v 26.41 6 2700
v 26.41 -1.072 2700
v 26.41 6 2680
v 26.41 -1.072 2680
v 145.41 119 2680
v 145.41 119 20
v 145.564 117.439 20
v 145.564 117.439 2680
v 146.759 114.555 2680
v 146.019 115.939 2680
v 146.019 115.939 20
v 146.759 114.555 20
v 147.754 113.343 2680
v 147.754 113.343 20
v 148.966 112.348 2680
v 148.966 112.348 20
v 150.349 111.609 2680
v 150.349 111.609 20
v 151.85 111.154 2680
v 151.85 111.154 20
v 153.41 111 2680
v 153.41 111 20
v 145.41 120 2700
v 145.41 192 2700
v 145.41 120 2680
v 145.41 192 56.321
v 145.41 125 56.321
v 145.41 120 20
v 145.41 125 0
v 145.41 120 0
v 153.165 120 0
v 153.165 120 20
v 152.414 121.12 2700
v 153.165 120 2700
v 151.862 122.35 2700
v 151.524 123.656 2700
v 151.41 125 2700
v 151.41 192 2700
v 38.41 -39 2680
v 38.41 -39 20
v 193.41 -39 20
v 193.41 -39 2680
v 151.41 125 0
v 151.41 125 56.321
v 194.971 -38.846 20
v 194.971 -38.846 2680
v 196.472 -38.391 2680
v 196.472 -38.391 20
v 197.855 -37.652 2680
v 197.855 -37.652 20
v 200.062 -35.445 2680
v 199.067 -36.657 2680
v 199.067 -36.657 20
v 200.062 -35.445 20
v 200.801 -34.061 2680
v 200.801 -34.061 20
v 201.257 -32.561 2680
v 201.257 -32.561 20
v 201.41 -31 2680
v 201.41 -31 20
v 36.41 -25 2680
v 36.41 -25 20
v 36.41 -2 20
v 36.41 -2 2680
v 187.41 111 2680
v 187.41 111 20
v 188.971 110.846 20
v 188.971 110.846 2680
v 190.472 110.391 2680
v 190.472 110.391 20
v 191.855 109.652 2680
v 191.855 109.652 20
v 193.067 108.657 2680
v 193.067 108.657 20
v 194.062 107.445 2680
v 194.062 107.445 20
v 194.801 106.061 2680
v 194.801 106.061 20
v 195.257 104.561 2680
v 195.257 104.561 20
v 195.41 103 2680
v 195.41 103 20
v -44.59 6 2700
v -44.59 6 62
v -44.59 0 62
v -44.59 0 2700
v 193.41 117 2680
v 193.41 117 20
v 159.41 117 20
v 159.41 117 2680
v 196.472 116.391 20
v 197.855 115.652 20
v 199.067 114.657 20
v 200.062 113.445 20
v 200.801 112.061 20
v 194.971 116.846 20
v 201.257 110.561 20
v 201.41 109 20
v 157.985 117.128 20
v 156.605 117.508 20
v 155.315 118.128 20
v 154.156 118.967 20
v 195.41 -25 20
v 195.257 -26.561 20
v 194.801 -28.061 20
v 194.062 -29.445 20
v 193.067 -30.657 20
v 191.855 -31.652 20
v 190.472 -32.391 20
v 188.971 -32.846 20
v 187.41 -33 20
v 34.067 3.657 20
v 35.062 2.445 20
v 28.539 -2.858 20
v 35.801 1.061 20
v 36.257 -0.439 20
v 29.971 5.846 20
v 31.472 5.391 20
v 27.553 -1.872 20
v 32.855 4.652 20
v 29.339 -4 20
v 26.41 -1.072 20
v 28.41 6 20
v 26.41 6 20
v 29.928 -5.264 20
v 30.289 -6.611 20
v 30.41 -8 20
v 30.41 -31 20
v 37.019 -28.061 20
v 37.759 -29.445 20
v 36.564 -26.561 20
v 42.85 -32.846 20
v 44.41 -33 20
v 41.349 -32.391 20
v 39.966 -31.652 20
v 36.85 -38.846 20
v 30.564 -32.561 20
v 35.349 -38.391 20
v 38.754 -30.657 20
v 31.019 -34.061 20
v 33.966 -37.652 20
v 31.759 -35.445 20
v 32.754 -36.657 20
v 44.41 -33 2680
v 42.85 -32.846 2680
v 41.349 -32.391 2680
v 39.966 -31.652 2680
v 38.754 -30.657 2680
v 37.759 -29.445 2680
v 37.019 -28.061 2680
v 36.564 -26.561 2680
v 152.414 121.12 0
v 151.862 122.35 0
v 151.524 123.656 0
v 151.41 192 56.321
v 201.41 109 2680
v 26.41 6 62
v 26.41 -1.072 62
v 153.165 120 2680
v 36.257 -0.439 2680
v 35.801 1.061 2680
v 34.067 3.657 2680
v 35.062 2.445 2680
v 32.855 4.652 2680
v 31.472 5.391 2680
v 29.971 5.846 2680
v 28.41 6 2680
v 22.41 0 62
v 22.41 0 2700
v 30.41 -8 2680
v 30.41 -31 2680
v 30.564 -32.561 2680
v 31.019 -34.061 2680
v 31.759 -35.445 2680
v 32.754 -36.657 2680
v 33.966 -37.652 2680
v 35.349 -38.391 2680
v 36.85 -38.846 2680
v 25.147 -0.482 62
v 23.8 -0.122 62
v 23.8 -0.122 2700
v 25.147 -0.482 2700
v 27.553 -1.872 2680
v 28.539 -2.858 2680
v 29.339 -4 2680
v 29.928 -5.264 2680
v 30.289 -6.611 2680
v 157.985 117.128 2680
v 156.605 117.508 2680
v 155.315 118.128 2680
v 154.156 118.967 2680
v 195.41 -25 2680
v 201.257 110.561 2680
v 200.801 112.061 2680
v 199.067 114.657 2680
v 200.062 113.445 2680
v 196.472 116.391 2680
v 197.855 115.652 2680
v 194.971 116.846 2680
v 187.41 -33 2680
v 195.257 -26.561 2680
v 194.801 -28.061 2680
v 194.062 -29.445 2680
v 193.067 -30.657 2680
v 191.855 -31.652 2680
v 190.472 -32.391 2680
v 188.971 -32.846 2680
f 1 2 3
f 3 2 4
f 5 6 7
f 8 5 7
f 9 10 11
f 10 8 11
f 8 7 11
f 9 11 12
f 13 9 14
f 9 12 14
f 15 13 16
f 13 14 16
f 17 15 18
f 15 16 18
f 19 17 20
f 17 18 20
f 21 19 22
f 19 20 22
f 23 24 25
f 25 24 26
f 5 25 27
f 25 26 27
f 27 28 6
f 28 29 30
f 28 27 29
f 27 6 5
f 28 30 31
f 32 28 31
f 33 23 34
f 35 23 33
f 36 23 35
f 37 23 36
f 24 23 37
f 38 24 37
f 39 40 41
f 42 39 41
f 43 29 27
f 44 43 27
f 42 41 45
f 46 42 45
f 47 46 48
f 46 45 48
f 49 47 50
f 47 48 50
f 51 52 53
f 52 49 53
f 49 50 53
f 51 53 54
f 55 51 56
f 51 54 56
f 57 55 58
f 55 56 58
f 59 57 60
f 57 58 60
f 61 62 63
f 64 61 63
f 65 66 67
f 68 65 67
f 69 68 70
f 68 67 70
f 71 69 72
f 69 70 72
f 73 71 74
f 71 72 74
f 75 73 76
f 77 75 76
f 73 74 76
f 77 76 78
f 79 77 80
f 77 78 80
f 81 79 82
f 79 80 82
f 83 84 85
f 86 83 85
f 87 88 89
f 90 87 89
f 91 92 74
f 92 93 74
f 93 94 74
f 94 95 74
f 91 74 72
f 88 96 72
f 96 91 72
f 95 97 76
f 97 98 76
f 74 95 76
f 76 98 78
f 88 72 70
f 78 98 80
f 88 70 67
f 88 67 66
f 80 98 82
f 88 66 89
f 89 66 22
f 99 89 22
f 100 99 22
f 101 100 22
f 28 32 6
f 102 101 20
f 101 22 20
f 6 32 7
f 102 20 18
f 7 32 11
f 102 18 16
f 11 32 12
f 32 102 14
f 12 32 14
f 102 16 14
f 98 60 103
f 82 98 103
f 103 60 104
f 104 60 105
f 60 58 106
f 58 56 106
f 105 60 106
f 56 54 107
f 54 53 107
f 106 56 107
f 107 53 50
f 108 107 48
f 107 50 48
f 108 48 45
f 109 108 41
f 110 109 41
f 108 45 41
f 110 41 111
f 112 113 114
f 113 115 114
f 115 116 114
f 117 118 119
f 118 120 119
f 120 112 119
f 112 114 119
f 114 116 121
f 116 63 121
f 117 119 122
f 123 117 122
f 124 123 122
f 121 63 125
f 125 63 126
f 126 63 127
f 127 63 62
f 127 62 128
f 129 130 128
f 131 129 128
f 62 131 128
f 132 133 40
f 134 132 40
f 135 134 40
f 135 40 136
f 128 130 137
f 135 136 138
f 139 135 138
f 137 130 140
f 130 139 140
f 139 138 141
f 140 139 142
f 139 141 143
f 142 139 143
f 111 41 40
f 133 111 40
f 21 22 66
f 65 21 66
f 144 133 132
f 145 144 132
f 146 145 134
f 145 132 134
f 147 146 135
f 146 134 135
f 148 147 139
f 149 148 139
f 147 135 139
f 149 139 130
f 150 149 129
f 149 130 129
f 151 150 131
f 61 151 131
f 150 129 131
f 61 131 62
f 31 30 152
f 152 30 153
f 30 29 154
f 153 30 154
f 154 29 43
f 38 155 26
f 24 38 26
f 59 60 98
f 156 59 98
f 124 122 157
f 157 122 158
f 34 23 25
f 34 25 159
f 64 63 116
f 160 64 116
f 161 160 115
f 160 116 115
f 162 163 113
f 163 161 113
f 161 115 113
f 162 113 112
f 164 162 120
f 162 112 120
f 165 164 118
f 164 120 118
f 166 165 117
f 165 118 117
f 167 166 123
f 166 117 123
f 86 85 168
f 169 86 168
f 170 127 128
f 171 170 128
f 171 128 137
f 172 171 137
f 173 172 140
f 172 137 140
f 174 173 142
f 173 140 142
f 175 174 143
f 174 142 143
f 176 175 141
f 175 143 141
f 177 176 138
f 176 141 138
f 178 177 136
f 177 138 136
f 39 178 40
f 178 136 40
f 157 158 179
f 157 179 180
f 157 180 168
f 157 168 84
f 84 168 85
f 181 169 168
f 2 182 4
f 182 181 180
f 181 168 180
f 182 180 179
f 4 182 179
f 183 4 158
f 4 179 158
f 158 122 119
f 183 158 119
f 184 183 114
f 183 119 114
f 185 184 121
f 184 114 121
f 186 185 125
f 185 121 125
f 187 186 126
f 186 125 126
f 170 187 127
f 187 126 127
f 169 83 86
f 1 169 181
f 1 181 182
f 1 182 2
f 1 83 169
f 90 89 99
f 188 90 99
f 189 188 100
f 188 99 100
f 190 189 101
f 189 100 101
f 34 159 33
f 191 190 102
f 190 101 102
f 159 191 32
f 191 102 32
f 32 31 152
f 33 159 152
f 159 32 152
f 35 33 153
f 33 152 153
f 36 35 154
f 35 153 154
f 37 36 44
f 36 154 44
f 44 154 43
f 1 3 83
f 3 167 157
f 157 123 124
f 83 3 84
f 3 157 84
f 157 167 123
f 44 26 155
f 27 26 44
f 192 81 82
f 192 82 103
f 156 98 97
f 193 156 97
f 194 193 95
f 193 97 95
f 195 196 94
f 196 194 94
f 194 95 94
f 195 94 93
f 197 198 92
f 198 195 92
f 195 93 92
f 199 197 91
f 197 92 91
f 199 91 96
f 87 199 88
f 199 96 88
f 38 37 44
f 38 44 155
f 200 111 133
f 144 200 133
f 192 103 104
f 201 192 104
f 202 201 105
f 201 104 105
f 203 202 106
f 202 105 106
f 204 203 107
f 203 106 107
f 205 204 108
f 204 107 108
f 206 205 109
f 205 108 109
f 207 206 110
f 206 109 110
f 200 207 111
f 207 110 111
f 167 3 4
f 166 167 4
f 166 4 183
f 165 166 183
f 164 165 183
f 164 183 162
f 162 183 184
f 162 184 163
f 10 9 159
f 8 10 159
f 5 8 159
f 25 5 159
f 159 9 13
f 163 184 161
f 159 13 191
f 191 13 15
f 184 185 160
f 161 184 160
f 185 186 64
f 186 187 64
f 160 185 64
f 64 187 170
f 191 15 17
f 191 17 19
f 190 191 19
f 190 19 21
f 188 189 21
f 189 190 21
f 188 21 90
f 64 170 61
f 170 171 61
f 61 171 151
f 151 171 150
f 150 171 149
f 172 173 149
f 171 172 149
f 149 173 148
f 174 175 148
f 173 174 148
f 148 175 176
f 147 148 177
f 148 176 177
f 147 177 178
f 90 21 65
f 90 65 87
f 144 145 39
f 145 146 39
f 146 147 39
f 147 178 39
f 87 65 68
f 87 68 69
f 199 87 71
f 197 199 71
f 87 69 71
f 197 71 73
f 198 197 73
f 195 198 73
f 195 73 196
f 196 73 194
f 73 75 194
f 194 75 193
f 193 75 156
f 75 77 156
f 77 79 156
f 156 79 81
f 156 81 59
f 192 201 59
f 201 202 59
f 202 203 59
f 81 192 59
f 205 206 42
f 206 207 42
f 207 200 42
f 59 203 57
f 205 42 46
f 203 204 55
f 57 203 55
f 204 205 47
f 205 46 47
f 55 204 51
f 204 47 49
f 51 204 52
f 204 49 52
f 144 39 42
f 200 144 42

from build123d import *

# Parameters (mm, degrees)
F1_DEPTH      = 2700
F3_DEPTH      = 159
F5_W          = 67
F5_H          = 56.321
F6_DEPTH      = 25
F8_DEPTH      = 192.001
F8_DEPTH_BACK = 39.001


with BuildPart() as f1:
    # F0 (on Top) → F1 (new body)
    with BuildSketch(Plane.XY):
        with BuildLine():
            Line((-44.5896353125, 6), (-44.5896353125, 0))
            Line((-44.5896353125, 0), (22.4103646875, 0))
            ThreePointArc((22.4103646875, 0), (28.067218937, -2.3431457505), (30.4103646875, -8))
            Line((30.4103646875, -8), (30.4103646875, -31))
            ThreePointArc((30.4103646875, -31), (32.753510438, -36.6568542495), (38.4103646875, -39))
            Line((38.4103646875, -39), (193.4103646875, -39))
            ThreePointArc((193.4103646875, -39), (199.067218937, -36.6568542495), (201.4103646875, -31))
            Line((201.4103646875, -31), (201.4103646875, 109))
            ThreePointArc((201.4103646875, 109), (199.067218937, 114.6568542495), (193.4103646875, 117))
            Line((193.4103646875, 117), (159.4103646875, 117))
            ThreePointArc((159.4103646875, 117), (153.753510438, 119.3431457505), (151.4103646875, 125))
            Line((151.4103646875, 125), (151.4103646875, 192))
            Line((151.4103646875, 192), (145.4103646875, 192))
            Line((145.4103646875, 192), (145.4103646875, 119))
            ThreePointArc((145.4103646875, 119), (147.753510438, 113.3431457505), (153.4103646875, 111))
            Line((153.4103646875, 111), (187.4103646875, 111))
            ThreePointArc((187.4103646875, 111), (193.067218937, 108.6568542495), (195.4103646875, 103))
            Line((195.4103646875, 103), (195.4103646875, -25))
            ThreePointArc((195.4103646875, -25), (193.067218937, -30.6568542495), (187.4103646875, -33))
            Line((187.4103646875, -33), (44.4103646875, -33))
            ThreePointArc((44.4103646875, -33), (38.753510438, -30.6568542495), (36.4103646875, -25))
            Line((36.4103646875, -25), (36.4103646875, -2))
            ThreePointArc((36.4103646875, -2), (34.067218937, 3.6568542495), (28.4103646875, 6))
            Line((28.4103646875, 6), (-44.5896353125, 6))
        make_face()
    extrude(amount=F1_DEPTH)

    # F2 (on face) → F3 (cut)
    with BuildSketch(Plane.XZ.offset(39)):
        Polygon((201.4103646875, 0), (201.4103646875, 20), (193.4103646875, 20), (26.4103646875, 20), (26.4103646875, 0), (38.4103646875, 0), (193.4103646875, 0), align=None)
        Polygon((193.4103646875, 2700), (38.4103646875, 2700), (26.4103646875, 2700), (26.4103646875, 2680), (193.4103646875, 2680), (201.4103646875, 2680), (201.4103646875, 2700), align=None)
    extrude(amount=-F3_DEPTH, mode=Mode.SUBTRACT)

    # F5 (on face) → F6 (cut)
    with BuildSketch(Plane(origin=(145.4103646875, 0, 0), x_dir=(0, -1, 0), z_dir=(-1, 0, 0))):
        with Locations((-158.5, 28.1605)):
            Rectangle(F5_W, F5_H)
    extrude(amount=-F6_DEPTH, mode=Mode.SUBTRACT)

    # F7 (on Front) → F8 (cut, two sides)
    with BuildSketch(Plane.XZ) as f8_sk:
        Polygon((-44.5896353125, 62), (-44.5896353125, 0), (22.4103646875, 0), (26.4103646875, 0), (26.4103646875, 20), (26.4103646875, 62), align=None)
    extrude(amount=-F8_DEPTH, mode=Mode.SUBTRACT)
    extrude(f8_sk.sketch, amount=F8_DEPTH_BACK, mode=Mode.SUBTRACT)


solid = f1.part
